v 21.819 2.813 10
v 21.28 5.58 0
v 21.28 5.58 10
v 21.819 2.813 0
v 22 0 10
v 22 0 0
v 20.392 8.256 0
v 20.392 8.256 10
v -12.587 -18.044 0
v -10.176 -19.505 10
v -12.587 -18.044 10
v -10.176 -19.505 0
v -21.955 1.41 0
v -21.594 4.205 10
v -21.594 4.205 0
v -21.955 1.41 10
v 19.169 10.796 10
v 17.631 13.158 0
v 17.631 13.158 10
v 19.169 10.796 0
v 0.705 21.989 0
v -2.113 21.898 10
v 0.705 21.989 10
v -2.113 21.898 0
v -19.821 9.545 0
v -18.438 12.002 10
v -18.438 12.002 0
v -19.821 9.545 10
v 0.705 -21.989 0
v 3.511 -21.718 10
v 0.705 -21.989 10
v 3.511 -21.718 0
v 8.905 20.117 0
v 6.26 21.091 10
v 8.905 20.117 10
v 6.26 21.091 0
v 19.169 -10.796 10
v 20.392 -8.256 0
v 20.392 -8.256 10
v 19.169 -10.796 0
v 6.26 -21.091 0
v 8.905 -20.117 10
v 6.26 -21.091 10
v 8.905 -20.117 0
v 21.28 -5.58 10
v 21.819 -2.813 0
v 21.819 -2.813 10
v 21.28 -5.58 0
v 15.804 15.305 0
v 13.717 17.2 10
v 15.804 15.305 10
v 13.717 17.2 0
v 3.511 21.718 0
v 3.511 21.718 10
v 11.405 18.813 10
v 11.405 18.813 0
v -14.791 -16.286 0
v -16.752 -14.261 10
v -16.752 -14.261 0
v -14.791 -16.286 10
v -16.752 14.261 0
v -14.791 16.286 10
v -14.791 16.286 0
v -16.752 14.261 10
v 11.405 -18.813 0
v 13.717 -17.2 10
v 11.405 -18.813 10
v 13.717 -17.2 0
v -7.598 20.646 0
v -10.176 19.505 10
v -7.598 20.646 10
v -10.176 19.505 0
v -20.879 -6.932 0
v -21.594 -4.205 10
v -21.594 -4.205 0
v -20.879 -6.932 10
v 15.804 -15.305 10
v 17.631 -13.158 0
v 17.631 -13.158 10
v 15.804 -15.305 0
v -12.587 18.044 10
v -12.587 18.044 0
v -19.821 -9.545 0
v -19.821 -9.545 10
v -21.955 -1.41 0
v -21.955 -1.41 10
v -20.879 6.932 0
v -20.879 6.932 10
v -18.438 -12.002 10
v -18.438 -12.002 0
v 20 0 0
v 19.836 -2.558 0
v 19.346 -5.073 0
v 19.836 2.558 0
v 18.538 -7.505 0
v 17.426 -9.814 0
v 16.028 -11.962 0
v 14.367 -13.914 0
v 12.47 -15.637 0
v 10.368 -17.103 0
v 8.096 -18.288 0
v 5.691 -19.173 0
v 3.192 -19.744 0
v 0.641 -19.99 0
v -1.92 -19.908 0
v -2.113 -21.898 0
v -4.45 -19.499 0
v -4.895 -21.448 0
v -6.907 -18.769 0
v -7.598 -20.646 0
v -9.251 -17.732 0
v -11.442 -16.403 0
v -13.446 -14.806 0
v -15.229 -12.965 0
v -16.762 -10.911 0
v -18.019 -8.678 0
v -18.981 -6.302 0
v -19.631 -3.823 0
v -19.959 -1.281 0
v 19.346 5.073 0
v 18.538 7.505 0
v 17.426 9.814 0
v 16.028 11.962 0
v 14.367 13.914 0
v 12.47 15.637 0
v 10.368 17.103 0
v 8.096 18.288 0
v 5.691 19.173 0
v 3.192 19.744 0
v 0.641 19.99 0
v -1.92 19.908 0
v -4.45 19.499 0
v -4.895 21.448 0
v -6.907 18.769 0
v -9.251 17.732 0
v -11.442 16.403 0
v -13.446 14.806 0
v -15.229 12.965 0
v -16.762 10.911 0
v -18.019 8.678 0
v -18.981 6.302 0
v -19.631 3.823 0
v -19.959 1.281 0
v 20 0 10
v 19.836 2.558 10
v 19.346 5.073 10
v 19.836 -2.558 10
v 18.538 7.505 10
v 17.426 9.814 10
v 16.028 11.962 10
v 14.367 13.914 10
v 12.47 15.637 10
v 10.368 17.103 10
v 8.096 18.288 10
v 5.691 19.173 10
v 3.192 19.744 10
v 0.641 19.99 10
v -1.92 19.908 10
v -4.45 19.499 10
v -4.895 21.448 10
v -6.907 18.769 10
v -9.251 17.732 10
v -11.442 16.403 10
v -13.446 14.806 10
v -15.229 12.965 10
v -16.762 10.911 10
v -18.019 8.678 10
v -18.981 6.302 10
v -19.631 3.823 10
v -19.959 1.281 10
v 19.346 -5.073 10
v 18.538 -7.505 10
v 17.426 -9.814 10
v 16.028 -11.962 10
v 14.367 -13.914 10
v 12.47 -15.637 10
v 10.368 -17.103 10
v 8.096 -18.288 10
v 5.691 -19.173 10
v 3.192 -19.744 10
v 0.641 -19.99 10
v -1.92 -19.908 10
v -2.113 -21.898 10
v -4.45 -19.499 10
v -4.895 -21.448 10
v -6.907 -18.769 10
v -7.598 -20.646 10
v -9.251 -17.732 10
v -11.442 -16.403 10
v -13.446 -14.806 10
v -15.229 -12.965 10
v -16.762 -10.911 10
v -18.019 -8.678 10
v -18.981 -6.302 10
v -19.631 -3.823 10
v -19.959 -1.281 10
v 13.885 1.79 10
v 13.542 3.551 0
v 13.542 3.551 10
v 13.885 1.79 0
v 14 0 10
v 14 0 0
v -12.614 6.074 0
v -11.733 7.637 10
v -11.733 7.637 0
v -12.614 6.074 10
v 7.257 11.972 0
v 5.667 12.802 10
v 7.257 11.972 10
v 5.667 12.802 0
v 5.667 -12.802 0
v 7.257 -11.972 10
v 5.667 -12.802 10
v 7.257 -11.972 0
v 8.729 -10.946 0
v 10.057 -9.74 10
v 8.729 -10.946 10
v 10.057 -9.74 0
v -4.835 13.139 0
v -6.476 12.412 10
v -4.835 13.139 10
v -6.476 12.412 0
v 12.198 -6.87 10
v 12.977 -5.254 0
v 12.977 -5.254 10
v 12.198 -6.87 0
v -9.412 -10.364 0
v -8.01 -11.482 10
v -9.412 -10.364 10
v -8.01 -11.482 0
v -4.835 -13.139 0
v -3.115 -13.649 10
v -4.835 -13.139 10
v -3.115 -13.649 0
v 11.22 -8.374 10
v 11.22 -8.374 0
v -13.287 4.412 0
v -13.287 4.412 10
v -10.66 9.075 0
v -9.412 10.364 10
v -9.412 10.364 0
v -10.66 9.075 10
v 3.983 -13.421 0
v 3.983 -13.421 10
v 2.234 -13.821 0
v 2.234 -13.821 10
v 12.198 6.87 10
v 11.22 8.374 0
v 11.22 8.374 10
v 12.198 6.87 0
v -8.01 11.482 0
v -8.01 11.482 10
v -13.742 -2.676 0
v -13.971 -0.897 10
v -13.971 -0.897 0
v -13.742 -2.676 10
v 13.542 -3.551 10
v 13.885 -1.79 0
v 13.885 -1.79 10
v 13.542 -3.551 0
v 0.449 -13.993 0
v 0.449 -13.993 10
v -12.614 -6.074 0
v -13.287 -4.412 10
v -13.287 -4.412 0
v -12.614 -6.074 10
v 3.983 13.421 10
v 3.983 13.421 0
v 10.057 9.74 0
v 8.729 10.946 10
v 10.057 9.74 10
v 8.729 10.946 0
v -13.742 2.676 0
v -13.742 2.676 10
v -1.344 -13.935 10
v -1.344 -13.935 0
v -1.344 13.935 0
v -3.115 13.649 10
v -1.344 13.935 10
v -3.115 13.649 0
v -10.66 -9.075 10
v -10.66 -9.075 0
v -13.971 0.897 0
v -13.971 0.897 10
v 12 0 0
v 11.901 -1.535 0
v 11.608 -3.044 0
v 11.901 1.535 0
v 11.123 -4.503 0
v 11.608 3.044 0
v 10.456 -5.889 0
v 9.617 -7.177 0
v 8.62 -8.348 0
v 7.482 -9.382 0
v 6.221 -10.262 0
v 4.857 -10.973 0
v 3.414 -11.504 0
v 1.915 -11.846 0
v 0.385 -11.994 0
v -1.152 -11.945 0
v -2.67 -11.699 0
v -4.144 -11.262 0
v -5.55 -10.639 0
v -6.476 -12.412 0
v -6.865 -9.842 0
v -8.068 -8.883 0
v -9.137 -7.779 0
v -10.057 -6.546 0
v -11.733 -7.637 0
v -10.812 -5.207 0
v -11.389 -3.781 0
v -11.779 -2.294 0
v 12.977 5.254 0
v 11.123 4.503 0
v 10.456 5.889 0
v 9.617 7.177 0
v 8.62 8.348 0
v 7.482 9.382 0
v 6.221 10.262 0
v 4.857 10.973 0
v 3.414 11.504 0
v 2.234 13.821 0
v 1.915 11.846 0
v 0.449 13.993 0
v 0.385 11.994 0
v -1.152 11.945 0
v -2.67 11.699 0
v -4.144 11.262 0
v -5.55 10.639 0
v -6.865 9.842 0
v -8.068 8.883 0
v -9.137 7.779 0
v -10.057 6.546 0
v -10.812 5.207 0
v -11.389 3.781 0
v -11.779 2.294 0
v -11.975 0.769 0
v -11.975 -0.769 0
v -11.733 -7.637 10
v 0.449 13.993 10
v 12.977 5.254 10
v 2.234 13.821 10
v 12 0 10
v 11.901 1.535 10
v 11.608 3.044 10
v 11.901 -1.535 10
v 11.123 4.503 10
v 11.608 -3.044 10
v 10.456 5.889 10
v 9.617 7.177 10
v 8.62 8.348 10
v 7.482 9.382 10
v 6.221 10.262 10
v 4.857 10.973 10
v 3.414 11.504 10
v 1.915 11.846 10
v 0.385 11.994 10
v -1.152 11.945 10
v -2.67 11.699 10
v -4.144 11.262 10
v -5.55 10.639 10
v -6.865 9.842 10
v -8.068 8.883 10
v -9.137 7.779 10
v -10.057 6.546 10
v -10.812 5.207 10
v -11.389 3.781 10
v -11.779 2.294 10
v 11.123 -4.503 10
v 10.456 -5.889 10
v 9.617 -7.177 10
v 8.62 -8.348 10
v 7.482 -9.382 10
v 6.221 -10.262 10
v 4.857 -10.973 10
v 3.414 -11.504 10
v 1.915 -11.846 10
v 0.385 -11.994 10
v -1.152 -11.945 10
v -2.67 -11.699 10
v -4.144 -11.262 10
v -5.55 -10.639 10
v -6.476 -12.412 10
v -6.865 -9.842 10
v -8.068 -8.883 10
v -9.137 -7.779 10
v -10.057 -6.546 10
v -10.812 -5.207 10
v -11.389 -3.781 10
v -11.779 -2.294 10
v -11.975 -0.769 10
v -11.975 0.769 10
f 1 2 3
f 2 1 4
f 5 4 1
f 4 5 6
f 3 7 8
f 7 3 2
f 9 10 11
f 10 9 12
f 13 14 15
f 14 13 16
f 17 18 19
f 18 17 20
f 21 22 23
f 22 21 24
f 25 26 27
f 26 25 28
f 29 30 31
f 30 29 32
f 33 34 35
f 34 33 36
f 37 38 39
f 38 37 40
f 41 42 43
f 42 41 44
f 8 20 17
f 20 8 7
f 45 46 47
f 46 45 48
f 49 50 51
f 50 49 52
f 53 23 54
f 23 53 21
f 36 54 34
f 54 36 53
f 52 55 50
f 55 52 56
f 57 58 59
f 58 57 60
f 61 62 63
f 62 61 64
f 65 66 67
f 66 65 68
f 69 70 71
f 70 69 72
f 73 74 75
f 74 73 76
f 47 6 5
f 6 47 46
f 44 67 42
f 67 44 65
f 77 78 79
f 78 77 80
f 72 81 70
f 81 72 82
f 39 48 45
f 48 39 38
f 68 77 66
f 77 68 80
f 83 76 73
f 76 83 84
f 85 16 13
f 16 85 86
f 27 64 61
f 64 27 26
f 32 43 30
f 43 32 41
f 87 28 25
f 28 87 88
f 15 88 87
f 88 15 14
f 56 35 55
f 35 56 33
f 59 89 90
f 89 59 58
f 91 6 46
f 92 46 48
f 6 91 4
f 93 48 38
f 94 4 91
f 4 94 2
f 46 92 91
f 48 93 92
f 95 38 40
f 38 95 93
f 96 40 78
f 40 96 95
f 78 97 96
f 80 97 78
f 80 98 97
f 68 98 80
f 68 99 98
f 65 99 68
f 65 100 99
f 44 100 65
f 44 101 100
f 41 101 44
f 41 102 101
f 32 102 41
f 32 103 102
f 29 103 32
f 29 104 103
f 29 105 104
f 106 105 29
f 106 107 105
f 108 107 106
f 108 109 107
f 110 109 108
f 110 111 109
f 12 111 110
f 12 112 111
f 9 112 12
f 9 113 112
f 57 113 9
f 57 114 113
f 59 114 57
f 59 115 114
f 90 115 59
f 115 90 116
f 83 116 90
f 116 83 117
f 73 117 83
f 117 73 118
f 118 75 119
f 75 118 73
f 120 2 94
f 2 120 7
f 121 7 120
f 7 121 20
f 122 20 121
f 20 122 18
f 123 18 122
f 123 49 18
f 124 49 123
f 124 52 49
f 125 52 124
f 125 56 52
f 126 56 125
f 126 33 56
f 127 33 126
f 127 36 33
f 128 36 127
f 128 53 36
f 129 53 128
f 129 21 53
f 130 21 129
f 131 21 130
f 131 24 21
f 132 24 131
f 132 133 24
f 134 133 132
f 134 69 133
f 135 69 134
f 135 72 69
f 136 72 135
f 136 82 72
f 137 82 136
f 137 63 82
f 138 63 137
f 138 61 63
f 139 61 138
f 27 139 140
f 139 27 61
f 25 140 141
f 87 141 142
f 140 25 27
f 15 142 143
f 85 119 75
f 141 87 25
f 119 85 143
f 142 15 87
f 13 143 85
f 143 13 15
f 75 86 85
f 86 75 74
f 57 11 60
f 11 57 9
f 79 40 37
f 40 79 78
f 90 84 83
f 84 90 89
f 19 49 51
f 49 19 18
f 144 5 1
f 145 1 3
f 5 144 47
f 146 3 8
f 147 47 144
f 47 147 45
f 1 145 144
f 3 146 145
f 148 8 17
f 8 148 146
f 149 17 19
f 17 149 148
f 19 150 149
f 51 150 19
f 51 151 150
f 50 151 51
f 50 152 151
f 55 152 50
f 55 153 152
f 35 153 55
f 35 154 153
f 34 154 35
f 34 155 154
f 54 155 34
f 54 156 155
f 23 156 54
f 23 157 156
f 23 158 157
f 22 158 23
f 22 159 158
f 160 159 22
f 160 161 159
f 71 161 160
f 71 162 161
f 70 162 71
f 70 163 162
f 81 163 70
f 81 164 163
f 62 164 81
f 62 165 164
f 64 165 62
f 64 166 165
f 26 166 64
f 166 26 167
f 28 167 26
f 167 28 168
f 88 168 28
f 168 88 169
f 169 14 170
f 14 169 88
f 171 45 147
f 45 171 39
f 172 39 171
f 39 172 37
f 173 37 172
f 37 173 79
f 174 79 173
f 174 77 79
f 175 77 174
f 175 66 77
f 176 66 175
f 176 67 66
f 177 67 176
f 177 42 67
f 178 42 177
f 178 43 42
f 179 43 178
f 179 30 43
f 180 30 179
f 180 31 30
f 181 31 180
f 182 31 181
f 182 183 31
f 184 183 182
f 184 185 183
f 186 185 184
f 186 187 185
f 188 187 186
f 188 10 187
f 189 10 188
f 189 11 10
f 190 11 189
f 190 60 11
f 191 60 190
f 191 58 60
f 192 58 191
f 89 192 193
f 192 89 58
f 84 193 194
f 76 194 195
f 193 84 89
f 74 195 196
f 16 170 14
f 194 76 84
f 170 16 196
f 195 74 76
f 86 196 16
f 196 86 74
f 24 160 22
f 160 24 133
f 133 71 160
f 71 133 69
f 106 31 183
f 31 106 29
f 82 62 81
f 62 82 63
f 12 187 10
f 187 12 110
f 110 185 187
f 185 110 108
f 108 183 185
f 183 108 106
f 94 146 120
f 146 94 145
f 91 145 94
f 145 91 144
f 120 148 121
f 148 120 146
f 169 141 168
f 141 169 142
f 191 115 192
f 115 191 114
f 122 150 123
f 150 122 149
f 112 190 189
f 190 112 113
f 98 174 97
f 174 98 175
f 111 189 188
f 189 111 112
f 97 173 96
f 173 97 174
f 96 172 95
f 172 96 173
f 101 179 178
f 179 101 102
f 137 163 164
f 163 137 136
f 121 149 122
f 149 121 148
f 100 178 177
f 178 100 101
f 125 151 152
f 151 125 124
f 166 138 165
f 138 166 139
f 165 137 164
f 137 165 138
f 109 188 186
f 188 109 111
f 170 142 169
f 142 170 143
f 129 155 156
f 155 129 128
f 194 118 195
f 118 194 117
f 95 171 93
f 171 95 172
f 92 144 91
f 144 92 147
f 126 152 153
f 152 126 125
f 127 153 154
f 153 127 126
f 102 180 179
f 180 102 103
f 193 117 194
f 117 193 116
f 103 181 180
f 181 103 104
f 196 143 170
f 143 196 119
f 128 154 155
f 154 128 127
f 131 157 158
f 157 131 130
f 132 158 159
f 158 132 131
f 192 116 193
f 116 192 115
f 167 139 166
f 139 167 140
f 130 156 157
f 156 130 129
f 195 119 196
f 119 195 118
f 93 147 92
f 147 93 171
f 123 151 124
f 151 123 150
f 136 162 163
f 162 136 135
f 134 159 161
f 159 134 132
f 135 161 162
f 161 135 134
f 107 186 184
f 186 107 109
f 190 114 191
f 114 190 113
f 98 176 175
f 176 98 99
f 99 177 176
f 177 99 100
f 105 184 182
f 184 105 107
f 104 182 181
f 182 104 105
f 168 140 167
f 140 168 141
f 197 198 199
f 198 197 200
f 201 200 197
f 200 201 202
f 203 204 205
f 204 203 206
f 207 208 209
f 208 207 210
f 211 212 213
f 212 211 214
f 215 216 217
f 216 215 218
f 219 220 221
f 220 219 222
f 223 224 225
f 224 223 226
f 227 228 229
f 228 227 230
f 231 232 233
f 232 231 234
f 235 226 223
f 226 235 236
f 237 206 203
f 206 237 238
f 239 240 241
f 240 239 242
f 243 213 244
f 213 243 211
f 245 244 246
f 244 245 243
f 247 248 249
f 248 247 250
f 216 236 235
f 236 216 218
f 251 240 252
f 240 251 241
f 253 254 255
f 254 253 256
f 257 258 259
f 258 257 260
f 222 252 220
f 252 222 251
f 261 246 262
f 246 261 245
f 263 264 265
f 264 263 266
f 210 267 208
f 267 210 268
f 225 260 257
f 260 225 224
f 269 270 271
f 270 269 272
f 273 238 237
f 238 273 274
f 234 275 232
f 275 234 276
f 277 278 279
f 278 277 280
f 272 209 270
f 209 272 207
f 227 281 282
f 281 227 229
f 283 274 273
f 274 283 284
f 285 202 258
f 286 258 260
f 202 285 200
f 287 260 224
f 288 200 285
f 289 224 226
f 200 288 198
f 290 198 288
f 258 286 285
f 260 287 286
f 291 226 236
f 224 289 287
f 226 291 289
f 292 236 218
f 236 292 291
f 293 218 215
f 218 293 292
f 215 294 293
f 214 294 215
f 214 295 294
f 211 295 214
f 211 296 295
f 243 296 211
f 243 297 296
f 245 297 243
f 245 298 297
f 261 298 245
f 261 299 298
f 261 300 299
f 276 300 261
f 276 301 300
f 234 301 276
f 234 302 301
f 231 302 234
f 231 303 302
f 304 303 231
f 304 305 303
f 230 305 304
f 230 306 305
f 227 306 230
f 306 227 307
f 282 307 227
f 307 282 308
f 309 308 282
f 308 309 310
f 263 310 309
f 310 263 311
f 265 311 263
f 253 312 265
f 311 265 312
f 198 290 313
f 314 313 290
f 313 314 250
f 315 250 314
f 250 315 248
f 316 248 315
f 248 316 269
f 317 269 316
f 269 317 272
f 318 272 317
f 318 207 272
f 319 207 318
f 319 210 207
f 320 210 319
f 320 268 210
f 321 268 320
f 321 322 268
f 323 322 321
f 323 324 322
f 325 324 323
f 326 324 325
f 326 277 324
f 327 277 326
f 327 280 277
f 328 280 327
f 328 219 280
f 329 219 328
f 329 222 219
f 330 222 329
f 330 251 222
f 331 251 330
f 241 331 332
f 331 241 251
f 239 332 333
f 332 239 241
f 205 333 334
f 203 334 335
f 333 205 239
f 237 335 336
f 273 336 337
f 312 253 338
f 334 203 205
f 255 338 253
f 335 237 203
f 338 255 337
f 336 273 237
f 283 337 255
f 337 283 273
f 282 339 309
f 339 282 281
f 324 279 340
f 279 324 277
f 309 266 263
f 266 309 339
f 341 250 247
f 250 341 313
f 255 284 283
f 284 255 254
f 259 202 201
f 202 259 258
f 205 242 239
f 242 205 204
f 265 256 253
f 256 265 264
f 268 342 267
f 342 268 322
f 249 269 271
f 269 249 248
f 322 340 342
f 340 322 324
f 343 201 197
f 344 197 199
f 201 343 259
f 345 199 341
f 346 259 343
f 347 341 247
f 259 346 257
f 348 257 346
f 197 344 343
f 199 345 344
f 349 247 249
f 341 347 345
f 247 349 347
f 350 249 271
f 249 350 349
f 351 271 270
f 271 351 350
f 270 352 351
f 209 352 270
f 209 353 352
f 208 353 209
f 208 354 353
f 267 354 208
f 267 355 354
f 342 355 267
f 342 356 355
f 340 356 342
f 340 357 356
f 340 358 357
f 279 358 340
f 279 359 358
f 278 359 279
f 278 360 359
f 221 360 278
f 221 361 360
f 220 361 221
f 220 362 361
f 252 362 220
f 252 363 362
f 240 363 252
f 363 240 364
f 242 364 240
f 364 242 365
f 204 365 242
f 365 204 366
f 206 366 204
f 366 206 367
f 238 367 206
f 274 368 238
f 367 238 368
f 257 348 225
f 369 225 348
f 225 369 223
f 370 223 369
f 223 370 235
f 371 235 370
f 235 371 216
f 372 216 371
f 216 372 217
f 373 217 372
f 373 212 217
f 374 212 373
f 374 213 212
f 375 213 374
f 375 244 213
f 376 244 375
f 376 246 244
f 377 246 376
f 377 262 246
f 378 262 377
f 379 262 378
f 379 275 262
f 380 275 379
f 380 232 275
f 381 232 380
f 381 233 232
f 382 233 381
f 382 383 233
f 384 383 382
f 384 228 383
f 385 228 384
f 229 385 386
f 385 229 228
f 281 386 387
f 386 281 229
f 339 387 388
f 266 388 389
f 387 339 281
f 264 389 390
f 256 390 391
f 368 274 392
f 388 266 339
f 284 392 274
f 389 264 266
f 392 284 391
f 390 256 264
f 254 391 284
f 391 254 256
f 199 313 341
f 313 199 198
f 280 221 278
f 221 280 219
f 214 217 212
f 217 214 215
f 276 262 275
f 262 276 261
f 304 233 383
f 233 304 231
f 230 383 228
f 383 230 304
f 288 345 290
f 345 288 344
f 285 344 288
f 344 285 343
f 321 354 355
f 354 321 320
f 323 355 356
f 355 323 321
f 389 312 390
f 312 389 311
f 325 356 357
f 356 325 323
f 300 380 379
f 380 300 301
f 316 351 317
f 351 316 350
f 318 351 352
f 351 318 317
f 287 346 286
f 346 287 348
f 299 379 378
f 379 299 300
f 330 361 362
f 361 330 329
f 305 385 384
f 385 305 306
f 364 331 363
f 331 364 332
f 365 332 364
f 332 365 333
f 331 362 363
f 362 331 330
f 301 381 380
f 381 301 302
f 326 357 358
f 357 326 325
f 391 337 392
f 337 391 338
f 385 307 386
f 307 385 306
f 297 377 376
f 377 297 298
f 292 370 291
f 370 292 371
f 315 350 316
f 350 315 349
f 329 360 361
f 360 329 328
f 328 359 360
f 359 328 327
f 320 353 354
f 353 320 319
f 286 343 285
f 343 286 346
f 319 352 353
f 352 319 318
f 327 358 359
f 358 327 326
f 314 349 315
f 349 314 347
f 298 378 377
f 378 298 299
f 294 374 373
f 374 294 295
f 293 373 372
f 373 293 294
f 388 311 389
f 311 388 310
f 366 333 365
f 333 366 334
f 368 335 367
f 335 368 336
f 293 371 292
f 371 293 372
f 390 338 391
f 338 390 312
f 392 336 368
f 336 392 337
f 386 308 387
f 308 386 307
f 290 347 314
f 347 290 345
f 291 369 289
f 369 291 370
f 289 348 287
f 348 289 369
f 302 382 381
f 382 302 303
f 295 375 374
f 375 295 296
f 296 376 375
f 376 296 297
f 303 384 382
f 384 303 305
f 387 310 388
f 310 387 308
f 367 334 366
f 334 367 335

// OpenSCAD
d=40;
w=0.4*5;


xxx(d);
//translate([0,0,20])
xxx(d-2*w*2*2);

module xxx(d)
{
    difference()
    {
        cylinder(d=d+2*w,h=10,$fn=49);
        translate([0,0,0])
        cylinder(d=d,h=10,$fn=49);
    }
}
